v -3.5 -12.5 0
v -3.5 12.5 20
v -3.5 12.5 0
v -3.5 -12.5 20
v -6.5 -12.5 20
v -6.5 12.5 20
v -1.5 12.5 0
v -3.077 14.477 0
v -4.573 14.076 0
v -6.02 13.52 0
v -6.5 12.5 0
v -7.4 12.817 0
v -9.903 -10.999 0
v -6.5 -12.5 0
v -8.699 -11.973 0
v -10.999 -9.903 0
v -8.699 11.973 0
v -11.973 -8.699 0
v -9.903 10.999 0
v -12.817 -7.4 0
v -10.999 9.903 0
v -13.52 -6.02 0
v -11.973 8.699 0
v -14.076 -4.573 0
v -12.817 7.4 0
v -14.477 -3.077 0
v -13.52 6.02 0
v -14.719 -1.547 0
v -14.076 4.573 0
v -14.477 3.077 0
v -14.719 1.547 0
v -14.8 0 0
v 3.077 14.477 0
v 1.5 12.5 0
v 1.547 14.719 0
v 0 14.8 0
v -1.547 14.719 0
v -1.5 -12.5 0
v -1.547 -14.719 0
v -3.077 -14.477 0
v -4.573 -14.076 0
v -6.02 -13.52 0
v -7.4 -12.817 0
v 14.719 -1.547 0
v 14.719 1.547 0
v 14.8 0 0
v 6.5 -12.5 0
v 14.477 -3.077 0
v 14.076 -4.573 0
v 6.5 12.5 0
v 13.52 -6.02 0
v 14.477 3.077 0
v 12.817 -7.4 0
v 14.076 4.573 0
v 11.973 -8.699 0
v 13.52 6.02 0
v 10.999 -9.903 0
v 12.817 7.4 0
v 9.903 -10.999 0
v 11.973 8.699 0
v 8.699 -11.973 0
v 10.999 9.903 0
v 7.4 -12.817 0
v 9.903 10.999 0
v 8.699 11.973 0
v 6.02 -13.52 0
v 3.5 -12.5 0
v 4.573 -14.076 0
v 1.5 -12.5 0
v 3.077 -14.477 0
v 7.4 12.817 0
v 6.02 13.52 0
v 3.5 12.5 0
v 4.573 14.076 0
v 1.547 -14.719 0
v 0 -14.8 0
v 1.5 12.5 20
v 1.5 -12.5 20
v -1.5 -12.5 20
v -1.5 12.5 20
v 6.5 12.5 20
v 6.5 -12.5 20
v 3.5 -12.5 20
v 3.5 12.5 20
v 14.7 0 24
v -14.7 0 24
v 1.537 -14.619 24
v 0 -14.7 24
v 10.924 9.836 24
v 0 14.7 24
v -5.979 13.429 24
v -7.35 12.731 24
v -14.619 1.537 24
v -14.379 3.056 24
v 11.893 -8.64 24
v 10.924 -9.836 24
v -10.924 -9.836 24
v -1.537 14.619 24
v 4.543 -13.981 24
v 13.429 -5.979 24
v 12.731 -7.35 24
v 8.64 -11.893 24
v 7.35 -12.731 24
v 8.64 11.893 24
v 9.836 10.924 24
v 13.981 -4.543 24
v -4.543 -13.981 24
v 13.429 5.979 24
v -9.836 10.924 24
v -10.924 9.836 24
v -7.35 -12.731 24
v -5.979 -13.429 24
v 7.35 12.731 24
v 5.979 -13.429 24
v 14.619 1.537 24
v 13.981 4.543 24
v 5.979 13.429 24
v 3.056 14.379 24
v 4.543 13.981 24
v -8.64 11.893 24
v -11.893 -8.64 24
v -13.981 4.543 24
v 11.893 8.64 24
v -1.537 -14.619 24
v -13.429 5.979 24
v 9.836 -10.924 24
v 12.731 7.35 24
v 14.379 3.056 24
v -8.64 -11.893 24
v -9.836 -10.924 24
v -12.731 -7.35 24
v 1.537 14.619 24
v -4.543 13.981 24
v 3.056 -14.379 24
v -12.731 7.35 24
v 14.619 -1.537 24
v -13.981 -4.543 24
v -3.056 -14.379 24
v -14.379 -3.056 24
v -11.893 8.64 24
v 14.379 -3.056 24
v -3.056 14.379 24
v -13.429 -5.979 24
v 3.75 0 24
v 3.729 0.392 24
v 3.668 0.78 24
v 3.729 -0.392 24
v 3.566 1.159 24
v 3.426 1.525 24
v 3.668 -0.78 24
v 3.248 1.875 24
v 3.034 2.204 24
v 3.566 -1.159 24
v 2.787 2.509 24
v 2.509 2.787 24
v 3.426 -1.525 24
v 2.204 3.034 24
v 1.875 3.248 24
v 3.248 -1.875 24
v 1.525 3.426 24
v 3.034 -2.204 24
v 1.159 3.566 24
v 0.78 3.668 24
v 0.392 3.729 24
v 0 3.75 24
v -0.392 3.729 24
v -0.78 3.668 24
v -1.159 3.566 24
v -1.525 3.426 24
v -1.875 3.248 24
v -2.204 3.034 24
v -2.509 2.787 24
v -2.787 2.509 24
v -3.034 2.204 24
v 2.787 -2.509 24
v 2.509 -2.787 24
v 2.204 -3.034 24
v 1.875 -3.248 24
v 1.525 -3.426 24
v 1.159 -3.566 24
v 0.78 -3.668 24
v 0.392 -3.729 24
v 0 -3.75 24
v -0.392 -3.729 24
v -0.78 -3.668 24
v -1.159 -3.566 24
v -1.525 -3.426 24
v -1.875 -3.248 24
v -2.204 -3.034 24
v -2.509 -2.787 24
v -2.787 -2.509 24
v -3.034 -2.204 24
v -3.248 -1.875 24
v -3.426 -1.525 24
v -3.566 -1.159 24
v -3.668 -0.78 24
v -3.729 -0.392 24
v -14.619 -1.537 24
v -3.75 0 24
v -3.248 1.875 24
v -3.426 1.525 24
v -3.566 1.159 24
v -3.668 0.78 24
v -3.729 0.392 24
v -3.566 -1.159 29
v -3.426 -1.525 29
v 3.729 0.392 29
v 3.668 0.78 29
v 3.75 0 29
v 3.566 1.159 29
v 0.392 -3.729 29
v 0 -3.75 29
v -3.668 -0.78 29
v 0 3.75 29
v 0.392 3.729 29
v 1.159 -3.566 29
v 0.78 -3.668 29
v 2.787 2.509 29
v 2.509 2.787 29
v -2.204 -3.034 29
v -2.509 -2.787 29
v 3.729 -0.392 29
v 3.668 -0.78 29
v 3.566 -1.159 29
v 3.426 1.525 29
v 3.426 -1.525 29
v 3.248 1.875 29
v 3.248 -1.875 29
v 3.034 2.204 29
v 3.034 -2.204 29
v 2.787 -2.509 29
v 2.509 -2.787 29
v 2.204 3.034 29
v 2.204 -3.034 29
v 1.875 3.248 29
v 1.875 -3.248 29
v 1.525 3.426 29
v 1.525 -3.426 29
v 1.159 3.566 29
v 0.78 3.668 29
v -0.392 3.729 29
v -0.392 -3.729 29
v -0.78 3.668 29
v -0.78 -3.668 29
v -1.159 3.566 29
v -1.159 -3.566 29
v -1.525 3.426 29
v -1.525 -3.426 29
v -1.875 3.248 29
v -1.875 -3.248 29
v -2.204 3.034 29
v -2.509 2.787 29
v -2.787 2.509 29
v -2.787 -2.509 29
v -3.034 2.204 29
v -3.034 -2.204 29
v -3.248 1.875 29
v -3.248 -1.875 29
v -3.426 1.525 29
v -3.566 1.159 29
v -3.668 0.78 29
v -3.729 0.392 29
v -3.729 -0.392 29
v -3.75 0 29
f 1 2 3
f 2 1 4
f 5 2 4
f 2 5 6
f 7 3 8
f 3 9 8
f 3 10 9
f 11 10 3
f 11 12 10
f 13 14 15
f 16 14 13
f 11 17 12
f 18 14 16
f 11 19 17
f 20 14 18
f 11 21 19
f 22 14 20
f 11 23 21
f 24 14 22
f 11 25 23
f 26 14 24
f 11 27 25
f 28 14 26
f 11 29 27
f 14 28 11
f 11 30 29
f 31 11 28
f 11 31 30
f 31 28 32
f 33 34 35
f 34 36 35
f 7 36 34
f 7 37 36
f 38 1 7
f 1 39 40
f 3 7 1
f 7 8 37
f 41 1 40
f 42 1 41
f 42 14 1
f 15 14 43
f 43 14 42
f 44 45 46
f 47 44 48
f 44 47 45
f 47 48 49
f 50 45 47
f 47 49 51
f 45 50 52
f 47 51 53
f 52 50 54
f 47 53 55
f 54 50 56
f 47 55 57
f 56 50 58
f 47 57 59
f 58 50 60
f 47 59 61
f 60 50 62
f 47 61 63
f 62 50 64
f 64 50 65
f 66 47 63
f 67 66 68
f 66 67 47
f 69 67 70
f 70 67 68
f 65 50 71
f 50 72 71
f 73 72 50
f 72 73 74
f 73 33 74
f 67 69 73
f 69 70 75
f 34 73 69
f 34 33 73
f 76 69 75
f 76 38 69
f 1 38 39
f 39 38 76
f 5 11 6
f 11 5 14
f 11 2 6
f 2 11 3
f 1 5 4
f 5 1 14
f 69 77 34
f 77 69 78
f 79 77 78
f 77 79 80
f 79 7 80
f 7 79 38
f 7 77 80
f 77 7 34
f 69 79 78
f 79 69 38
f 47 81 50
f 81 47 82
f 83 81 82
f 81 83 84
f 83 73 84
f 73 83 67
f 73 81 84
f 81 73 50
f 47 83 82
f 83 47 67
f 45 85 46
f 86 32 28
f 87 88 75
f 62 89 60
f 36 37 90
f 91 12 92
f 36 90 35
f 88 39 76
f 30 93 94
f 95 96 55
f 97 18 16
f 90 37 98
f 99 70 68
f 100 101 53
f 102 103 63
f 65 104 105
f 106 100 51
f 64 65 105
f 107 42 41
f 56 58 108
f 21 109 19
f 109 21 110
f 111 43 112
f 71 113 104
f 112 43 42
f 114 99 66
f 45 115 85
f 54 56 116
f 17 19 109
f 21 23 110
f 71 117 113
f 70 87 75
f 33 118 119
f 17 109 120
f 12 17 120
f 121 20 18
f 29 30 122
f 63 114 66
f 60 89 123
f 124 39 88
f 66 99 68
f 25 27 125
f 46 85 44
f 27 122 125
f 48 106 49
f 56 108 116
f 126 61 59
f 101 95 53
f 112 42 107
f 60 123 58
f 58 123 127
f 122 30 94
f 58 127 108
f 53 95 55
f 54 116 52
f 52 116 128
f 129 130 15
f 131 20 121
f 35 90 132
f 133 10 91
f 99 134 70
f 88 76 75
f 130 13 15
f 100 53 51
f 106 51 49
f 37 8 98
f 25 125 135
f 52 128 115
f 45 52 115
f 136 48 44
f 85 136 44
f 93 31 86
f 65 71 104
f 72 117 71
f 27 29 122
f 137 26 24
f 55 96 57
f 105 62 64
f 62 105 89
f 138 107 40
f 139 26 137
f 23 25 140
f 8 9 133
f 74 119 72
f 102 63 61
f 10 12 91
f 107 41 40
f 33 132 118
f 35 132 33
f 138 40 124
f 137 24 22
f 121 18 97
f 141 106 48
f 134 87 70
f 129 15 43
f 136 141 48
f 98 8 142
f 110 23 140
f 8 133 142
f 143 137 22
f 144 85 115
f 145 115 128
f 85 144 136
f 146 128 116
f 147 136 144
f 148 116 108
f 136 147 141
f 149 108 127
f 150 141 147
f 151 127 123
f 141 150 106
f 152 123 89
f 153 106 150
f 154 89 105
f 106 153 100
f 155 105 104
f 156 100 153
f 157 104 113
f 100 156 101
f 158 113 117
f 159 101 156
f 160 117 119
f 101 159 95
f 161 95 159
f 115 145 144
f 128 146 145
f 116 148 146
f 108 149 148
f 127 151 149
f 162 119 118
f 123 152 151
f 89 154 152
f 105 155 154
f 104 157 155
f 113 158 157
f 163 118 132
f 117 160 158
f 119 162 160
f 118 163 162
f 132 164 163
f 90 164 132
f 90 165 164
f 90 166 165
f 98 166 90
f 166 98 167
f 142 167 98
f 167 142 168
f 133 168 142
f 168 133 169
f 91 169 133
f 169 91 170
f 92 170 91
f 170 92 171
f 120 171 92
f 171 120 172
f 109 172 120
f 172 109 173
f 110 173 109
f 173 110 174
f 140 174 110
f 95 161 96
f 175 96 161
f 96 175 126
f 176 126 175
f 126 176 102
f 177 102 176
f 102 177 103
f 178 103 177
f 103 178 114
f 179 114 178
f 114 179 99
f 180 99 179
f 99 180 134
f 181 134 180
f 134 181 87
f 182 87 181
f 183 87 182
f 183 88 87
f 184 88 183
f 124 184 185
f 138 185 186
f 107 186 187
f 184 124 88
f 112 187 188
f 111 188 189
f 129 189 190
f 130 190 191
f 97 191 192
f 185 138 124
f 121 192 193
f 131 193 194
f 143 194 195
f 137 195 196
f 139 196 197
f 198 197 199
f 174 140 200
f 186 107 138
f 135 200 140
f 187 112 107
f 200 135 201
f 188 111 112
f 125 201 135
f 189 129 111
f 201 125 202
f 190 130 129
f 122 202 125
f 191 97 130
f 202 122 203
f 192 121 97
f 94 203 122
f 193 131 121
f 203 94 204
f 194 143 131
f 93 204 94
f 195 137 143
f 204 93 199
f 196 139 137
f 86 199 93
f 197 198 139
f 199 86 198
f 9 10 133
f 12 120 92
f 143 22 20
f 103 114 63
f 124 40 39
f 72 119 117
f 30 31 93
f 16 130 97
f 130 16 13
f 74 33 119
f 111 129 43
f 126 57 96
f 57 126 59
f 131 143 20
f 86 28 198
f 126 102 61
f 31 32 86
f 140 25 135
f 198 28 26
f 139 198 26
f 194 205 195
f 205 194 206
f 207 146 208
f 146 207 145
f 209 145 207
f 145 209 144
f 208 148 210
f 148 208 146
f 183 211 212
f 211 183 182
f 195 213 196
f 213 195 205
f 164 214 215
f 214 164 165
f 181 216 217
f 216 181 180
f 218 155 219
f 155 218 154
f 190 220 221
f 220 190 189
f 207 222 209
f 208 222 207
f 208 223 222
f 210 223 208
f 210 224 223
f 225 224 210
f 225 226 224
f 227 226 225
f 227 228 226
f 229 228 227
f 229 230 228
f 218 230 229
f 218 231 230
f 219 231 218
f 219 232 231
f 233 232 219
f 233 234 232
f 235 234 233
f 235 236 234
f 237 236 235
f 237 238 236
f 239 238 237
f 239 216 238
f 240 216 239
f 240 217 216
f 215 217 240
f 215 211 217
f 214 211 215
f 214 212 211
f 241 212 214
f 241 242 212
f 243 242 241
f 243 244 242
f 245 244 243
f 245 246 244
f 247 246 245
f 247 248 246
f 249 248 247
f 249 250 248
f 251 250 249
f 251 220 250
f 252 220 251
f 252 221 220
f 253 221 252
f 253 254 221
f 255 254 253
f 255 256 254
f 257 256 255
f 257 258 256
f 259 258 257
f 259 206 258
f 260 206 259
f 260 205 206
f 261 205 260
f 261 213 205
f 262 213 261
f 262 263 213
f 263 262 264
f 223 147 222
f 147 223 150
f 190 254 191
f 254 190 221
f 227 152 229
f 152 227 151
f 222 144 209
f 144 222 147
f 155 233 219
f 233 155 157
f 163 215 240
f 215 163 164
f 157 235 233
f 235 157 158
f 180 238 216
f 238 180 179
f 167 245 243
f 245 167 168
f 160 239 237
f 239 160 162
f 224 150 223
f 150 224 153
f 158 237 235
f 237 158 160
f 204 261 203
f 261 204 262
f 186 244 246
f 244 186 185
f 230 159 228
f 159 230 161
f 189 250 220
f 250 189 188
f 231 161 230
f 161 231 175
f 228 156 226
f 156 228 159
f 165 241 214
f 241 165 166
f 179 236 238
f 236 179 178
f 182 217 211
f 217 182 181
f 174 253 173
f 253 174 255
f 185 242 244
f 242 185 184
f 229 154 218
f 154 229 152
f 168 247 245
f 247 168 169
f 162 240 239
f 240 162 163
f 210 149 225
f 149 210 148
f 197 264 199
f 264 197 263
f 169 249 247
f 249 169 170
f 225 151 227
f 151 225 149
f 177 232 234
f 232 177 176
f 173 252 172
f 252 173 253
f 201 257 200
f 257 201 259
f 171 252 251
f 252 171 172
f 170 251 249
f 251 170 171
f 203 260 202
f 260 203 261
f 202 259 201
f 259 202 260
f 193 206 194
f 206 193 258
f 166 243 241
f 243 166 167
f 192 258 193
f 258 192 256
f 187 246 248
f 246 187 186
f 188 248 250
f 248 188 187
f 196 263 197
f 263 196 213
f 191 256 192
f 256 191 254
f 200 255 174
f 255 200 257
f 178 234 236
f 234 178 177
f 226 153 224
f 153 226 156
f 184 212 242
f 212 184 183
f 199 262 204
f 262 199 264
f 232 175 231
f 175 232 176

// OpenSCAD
// SD card adapter for film canister

$fn = 60;

module slot() {
    translate([-1.5, -12.5, 0]) {
        cube([3, 25, 20]);
    }
}

module body() {
    cylinder(r1 = 14.8, r2 = 14.7, h = 24);
}

module peg() {
    cylinder(r = 7.5/2, h = 5);
}

module holder() {
    union() {
        difference() {
            body();
            for (i = [-5:5:+5]) {
                translate([i, 0, 0]) {
                    slot();
                }
            }       
        }
        translate([0, 0, 24]) {
            peg();
        }
    }
}

holder();
